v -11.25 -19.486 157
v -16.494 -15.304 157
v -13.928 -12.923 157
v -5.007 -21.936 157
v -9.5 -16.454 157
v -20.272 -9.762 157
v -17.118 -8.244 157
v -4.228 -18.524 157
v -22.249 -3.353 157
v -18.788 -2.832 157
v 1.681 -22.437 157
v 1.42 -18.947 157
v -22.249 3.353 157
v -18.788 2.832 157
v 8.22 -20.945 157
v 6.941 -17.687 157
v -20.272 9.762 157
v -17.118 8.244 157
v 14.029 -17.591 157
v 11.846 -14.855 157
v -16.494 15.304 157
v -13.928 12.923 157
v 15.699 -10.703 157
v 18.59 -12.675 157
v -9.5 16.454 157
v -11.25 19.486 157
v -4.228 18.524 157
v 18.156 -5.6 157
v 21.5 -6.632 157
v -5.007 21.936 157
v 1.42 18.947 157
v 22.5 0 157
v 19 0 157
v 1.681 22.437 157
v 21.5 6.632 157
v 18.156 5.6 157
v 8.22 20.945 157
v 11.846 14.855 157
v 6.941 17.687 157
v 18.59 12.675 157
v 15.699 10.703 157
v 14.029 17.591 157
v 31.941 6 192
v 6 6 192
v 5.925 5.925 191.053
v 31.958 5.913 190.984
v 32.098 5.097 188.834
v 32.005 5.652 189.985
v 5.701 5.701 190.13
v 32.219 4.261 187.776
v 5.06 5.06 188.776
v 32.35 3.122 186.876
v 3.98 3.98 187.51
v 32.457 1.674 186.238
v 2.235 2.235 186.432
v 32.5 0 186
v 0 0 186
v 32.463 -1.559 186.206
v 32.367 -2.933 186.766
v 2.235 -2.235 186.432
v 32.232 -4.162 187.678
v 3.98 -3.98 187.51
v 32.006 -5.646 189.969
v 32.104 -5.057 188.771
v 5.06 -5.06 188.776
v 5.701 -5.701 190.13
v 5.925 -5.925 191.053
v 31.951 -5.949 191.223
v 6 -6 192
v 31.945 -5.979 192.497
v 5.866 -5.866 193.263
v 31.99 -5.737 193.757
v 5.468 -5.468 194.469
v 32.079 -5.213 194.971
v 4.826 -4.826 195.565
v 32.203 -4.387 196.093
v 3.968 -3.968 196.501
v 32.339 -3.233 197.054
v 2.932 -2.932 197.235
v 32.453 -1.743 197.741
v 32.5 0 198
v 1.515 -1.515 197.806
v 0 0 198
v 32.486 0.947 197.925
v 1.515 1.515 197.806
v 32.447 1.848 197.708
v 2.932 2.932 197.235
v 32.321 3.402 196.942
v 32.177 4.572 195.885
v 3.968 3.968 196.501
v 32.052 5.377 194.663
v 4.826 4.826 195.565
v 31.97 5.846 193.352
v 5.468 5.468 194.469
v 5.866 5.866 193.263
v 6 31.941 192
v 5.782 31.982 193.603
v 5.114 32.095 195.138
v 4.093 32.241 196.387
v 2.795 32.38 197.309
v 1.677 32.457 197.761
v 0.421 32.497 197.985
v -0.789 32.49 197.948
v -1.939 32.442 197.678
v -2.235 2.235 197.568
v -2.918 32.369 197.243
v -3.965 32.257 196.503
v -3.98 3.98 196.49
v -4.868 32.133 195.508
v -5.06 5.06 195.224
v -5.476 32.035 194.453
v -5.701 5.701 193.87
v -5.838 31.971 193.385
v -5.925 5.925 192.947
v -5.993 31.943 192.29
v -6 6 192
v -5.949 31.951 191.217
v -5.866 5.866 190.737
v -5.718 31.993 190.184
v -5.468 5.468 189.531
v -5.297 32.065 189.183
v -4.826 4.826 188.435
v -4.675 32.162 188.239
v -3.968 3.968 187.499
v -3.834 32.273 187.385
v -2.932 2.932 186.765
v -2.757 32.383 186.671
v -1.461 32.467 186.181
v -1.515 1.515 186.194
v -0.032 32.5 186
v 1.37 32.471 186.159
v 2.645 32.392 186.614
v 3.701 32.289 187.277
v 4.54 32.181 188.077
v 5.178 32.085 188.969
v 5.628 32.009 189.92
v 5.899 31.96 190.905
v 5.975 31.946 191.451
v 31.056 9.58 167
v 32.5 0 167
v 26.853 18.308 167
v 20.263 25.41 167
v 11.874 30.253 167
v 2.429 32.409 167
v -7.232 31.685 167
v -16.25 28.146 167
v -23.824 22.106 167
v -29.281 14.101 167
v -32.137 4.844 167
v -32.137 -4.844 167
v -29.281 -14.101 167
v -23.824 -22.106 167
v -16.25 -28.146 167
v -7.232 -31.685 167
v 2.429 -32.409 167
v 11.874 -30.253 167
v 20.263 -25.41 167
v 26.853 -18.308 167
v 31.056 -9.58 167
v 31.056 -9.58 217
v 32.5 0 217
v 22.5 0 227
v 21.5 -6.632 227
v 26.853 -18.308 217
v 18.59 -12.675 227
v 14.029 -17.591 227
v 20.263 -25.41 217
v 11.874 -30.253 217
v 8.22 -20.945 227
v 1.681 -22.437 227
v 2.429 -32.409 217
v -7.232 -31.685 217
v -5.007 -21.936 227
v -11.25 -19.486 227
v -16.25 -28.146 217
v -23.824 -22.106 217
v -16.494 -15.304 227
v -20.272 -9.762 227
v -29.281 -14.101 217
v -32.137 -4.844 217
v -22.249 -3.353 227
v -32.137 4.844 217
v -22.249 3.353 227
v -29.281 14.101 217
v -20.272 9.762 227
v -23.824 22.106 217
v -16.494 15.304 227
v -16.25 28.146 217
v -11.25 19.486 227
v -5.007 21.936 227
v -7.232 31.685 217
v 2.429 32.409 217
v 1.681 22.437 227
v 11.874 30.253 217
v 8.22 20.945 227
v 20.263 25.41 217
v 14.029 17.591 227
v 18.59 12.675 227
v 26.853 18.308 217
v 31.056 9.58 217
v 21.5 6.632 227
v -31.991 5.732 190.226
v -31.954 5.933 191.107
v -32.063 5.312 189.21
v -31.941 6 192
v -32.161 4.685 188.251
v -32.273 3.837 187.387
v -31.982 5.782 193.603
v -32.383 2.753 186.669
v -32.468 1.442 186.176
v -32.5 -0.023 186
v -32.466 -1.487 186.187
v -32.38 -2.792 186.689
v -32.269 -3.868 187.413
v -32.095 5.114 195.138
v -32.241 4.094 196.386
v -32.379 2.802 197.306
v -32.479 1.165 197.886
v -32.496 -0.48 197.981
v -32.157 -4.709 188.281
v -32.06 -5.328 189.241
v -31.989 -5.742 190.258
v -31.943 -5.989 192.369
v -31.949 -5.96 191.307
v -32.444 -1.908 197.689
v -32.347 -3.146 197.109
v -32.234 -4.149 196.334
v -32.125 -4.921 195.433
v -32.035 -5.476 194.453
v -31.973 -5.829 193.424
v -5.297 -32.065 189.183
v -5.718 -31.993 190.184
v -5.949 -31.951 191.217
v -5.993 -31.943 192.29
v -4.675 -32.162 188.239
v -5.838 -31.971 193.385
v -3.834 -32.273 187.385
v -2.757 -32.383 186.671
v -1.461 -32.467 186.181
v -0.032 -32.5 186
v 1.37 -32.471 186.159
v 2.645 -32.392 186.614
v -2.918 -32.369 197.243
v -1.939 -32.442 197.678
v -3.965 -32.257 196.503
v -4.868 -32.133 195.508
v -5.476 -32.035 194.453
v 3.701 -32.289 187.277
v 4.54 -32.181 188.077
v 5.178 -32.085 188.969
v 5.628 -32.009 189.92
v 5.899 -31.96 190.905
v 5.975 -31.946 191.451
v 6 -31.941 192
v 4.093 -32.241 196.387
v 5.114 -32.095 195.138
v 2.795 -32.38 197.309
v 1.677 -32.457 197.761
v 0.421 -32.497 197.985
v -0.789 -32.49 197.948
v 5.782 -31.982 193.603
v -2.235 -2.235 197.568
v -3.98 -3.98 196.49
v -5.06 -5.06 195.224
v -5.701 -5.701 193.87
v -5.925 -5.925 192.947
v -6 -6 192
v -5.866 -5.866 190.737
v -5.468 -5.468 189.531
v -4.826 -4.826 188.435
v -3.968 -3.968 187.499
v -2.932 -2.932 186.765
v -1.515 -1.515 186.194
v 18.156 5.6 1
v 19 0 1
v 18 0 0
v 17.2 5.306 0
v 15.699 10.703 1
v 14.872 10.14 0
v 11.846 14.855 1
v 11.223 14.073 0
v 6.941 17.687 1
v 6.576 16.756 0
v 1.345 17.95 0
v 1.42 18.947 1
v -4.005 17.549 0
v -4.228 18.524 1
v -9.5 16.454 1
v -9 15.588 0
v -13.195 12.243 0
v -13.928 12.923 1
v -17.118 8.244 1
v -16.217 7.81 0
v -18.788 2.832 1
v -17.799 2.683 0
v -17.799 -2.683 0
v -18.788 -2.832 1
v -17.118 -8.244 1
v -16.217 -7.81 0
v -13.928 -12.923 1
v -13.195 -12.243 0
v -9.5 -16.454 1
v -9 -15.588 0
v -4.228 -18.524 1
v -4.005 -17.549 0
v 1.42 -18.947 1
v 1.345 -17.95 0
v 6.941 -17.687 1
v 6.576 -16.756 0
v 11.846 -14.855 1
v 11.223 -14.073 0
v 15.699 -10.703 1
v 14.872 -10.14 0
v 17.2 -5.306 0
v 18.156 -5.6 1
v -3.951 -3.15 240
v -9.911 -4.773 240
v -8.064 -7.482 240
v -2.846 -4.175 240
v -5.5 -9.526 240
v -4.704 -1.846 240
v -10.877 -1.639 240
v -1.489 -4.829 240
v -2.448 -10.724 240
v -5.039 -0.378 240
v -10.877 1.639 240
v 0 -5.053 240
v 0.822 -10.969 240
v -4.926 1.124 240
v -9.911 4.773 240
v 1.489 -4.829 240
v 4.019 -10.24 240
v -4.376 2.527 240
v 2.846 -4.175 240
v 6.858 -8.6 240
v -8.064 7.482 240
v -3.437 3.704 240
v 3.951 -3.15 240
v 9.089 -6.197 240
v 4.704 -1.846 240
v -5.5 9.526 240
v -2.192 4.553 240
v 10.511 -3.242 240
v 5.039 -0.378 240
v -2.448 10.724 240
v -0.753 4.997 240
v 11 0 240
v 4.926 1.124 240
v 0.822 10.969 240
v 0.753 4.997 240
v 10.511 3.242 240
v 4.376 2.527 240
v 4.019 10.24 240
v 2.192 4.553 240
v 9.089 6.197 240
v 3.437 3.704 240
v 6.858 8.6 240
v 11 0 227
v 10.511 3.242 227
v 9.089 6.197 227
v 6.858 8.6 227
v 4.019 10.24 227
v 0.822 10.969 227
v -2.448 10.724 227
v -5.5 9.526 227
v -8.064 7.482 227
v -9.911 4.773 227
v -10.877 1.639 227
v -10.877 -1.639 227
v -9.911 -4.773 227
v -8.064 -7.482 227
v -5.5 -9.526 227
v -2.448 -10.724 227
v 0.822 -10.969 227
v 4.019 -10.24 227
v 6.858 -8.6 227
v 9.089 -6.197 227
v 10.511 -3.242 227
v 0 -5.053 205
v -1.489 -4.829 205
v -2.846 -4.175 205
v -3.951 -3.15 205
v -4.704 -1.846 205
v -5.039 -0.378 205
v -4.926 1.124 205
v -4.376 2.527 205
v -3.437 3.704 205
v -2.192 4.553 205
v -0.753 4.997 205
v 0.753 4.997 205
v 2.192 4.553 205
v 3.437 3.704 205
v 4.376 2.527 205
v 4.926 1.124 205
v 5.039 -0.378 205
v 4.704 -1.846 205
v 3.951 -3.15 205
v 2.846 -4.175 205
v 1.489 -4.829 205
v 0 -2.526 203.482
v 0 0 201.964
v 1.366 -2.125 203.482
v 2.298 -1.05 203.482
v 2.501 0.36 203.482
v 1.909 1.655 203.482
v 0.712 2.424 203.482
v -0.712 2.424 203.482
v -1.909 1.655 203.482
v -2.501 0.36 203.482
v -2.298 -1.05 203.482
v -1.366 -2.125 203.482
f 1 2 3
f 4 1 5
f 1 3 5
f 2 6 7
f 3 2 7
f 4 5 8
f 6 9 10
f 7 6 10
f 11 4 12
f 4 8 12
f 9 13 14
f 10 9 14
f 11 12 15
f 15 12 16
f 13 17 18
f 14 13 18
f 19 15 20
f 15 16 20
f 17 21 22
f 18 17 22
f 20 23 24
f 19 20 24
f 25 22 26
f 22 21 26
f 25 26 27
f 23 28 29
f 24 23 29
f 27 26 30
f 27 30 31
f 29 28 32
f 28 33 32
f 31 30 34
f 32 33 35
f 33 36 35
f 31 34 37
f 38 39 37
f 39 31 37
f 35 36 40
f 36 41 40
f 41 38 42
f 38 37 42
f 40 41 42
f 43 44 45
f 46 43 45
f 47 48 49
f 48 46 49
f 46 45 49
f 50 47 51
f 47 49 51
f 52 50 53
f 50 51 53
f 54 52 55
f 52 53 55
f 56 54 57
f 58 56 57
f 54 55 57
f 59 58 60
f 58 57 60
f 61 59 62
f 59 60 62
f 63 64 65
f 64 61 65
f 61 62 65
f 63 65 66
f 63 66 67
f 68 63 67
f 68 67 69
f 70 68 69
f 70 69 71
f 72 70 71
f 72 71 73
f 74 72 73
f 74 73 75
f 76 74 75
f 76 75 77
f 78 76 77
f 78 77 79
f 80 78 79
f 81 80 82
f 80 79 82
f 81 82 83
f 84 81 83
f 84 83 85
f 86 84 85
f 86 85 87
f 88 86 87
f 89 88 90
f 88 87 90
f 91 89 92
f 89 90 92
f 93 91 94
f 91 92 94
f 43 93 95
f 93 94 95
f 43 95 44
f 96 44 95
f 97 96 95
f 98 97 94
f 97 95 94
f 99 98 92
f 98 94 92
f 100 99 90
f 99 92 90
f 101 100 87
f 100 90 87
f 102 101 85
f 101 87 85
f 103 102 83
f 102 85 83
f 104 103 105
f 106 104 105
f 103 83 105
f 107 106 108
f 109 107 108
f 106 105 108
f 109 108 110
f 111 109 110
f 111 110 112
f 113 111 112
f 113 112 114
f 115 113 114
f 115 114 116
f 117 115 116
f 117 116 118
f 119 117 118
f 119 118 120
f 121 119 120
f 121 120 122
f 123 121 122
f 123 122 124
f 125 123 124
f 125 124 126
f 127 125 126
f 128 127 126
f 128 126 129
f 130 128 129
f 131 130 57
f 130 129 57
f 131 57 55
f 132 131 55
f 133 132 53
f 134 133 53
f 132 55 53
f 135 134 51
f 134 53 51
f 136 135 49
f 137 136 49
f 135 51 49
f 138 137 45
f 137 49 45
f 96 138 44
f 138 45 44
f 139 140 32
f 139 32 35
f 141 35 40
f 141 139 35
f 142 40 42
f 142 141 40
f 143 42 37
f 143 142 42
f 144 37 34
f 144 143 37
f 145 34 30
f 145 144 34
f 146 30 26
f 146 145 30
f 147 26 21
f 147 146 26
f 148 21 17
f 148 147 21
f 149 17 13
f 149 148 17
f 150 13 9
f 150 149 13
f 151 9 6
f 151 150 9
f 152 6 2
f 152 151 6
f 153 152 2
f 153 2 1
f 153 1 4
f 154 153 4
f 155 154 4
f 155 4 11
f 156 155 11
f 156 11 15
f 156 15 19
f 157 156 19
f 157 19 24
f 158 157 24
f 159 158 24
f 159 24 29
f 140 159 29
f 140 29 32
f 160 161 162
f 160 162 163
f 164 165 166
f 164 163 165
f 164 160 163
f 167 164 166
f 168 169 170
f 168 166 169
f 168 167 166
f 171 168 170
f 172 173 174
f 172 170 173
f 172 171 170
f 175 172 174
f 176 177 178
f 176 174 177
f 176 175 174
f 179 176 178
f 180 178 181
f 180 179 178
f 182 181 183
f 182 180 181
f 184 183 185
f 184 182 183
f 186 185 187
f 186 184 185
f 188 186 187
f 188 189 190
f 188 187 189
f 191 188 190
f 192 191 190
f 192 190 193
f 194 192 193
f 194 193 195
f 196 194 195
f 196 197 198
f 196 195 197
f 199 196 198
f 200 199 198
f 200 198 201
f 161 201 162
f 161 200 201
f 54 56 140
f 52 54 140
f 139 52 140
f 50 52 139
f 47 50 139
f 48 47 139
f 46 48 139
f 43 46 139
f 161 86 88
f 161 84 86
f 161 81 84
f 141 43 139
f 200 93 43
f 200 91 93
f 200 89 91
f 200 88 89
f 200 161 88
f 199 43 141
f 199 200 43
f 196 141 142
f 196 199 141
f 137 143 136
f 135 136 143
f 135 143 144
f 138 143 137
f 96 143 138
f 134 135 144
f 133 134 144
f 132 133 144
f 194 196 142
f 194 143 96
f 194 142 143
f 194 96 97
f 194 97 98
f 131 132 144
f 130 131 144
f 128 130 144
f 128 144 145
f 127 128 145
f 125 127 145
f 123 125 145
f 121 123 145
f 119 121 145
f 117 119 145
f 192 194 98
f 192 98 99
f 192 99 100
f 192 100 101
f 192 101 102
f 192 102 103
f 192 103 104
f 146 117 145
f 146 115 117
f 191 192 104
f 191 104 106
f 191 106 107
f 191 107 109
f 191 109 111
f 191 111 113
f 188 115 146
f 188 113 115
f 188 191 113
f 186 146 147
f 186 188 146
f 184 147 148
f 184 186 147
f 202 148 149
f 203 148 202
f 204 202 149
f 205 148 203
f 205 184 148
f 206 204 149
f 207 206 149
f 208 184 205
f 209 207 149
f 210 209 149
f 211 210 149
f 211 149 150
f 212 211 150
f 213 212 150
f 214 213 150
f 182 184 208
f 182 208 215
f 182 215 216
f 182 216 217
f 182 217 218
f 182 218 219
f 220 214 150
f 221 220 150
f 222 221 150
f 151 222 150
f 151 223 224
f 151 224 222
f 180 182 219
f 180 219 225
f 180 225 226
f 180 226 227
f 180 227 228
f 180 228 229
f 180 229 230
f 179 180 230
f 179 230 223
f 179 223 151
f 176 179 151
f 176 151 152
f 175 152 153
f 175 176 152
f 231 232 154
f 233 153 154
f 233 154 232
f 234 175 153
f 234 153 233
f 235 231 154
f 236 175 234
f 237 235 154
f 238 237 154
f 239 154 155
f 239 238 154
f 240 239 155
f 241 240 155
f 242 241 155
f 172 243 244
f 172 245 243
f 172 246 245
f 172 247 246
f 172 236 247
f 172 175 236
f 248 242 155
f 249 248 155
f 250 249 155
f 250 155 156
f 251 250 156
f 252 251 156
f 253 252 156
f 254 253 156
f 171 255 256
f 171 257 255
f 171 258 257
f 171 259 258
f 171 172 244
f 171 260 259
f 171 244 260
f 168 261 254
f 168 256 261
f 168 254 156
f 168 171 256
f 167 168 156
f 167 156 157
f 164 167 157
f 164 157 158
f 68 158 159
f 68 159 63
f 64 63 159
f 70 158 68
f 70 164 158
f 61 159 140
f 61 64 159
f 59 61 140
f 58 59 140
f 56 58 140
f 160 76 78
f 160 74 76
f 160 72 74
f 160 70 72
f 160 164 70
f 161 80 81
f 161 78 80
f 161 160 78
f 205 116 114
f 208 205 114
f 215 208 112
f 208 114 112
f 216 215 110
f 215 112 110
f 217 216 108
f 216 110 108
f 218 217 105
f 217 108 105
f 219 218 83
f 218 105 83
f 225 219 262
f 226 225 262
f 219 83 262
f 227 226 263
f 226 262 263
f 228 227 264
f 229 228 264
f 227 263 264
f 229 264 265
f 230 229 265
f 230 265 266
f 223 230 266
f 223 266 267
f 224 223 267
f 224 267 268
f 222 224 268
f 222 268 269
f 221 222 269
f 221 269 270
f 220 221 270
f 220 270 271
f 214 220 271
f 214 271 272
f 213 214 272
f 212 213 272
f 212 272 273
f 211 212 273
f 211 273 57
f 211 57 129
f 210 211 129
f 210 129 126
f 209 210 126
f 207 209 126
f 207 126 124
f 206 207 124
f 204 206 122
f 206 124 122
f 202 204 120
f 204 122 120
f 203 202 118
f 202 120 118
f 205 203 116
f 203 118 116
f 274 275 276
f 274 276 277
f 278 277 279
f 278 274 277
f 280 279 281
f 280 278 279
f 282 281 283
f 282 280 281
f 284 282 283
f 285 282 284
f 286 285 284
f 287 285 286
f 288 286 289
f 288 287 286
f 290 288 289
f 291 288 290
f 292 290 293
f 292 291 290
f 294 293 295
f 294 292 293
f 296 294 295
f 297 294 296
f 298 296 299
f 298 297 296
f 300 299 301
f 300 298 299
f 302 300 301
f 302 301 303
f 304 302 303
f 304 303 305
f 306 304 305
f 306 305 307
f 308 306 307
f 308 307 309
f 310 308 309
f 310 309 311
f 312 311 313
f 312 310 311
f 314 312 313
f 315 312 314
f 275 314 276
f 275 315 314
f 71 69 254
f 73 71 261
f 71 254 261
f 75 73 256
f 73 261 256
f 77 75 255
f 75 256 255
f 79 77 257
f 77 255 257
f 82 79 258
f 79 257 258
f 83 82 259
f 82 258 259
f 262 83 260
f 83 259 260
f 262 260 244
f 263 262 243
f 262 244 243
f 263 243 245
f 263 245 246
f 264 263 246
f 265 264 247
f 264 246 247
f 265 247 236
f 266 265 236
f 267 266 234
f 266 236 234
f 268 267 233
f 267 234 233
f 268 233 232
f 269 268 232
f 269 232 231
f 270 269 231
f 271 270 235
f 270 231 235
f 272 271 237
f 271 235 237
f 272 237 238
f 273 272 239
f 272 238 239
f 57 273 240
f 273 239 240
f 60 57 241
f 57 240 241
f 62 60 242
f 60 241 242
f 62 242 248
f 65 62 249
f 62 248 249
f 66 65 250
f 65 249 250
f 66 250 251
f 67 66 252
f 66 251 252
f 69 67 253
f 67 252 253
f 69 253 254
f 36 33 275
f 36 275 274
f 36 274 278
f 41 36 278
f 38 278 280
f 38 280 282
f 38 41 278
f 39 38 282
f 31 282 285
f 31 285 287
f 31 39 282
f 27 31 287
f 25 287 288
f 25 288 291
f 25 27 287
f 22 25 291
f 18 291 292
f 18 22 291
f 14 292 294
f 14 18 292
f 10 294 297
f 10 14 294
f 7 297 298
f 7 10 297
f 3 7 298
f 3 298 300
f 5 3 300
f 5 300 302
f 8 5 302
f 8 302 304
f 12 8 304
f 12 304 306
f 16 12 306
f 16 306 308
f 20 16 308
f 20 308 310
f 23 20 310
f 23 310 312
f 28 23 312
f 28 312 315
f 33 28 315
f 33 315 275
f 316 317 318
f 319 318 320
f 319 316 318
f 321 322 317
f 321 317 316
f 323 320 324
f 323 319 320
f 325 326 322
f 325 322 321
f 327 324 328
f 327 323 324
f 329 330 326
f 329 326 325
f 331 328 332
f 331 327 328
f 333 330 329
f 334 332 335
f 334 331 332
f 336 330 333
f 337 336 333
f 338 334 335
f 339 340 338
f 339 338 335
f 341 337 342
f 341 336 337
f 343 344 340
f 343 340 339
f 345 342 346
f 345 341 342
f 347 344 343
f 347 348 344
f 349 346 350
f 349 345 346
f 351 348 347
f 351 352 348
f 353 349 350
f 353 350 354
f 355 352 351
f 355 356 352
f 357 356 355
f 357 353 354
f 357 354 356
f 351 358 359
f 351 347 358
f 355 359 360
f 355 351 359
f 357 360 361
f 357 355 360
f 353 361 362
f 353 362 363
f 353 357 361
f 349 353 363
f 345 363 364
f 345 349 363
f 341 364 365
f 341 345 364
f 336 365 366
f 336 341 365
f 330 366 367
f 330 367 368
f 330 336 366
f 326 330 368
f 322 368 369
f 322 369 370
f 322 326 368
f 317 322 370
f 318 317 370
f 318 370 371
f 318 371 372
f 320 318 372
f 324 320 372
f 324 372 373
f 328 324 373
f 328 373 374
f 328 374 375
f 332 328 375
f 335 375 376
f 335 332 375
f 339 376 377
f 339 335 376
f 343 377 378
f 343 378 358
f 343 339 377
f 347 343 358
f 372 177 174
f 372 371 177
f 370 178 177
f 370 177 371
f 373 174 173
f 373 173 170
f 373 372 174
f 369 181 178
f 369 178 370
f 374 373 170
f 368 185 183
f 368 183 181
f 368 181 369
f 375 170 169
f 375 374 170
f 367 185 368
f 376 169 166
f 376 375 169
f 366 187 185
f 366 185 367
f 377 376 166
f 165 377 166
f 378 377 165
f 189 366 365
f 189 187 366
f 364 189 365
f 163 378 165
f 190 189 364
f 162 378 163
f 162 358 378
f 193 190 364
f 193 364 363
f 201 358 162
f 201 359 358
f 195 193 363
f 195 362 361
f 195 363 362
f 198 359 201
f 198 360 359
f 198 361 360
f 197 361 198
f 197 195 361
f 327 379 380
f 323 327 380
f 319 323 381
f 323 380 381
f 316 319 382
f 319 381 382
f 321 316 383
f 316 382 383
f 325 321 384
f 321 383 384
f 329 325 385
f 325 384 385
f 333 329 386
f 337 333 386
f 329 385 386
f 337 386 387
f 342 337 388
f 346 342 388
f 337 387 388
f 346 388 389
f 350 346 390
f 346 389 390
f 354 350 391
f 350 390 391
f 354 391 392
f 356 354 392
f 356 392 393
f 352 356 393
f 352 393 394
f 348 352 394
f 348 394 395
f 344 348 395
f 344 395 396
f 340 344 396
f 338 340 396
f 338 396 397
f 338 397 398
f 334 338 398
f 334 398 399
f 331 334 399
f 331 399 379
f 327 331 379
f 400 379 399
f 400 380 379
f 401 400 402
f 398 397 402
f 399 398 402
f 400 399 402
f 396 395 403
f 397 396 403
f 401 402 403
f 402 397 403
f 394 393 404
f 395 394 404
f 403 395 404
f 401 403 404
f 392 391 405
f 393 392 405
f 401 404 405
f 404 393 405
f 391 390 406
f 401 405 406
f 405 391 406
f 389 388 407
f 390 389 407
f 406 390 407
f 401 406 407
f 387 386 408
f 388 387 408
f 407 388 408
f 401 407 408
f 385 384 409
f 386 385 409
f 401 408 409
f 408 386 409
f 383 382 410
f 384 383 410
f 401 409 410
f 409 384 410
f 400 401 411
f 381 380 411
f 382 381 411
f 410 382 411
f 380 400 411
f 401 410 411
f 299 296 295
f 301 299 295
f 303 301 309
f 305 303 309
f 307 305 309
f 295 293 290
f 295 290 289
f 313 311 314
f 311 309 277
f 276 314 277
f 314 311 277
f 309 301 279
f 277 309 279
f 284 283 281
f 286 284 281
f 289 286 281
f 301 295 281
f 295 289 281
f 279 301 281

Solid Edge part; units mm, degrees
sketch "Sketch1" plane through (0, 0, 0) normal (0, -1, 0) x (1, 0, 0)
  line L0 (32.5, 157) -> (32.5, 227)
  line L1 (32.5, 227) -> (11, 227)
  line L2 (11, 227) -> (11, 240)
  line L3 (11, 240) -> (0, 240)
  line L4 (0, 0) -> (0, 240)
  line L5 (0, 0) -> (19, 0)
  line L6 (19, 0) -> (19, 157)
  line L7 (19, 157) -> (32.5, 157)
revolve "RevolvedProtrusion1" add sketch "Sketch1" angle 360 about axis through (0, 0, 0) along (0, 0, 1)
chamfer "Chamfer1" distance 10 angle 45 1 edges at (-32.5, 0, 157)
chamfer "Chamfer_2" distance 10 angle 45 1 edges at (-32.5, 0, 227)
cosmetic_thread "Thread_1" size "Tr 38 x 10" thread depth 154
chamfer "Chamfer_4" distance 1 angle 45 1 edges at (-19, 0, 0)
hole "DRILL_Hole" at (0, 0, 240) direction (0, 0, -1) diameter 10.106 depth 35 tip angle 118 thread major 12 thread length 2
sketch "Sketch2" plane through (0, 0, 0) normal (0, -1, 0) x (1, 0, 0)
  circle A0 centre (0, 192) radius 6
extrude "Cutout1" cut sketch "Sketch2" along normal through all and the other way through all
sketch "Sketch3" plane through (0, 0, 0) normal (1, 0, 0) x (0, 1, 0)
  circle A0 centre (0, 192) radius 6
extrude "Cutout2" cut sketch "Sketch3" along normal through all and the other way through all
